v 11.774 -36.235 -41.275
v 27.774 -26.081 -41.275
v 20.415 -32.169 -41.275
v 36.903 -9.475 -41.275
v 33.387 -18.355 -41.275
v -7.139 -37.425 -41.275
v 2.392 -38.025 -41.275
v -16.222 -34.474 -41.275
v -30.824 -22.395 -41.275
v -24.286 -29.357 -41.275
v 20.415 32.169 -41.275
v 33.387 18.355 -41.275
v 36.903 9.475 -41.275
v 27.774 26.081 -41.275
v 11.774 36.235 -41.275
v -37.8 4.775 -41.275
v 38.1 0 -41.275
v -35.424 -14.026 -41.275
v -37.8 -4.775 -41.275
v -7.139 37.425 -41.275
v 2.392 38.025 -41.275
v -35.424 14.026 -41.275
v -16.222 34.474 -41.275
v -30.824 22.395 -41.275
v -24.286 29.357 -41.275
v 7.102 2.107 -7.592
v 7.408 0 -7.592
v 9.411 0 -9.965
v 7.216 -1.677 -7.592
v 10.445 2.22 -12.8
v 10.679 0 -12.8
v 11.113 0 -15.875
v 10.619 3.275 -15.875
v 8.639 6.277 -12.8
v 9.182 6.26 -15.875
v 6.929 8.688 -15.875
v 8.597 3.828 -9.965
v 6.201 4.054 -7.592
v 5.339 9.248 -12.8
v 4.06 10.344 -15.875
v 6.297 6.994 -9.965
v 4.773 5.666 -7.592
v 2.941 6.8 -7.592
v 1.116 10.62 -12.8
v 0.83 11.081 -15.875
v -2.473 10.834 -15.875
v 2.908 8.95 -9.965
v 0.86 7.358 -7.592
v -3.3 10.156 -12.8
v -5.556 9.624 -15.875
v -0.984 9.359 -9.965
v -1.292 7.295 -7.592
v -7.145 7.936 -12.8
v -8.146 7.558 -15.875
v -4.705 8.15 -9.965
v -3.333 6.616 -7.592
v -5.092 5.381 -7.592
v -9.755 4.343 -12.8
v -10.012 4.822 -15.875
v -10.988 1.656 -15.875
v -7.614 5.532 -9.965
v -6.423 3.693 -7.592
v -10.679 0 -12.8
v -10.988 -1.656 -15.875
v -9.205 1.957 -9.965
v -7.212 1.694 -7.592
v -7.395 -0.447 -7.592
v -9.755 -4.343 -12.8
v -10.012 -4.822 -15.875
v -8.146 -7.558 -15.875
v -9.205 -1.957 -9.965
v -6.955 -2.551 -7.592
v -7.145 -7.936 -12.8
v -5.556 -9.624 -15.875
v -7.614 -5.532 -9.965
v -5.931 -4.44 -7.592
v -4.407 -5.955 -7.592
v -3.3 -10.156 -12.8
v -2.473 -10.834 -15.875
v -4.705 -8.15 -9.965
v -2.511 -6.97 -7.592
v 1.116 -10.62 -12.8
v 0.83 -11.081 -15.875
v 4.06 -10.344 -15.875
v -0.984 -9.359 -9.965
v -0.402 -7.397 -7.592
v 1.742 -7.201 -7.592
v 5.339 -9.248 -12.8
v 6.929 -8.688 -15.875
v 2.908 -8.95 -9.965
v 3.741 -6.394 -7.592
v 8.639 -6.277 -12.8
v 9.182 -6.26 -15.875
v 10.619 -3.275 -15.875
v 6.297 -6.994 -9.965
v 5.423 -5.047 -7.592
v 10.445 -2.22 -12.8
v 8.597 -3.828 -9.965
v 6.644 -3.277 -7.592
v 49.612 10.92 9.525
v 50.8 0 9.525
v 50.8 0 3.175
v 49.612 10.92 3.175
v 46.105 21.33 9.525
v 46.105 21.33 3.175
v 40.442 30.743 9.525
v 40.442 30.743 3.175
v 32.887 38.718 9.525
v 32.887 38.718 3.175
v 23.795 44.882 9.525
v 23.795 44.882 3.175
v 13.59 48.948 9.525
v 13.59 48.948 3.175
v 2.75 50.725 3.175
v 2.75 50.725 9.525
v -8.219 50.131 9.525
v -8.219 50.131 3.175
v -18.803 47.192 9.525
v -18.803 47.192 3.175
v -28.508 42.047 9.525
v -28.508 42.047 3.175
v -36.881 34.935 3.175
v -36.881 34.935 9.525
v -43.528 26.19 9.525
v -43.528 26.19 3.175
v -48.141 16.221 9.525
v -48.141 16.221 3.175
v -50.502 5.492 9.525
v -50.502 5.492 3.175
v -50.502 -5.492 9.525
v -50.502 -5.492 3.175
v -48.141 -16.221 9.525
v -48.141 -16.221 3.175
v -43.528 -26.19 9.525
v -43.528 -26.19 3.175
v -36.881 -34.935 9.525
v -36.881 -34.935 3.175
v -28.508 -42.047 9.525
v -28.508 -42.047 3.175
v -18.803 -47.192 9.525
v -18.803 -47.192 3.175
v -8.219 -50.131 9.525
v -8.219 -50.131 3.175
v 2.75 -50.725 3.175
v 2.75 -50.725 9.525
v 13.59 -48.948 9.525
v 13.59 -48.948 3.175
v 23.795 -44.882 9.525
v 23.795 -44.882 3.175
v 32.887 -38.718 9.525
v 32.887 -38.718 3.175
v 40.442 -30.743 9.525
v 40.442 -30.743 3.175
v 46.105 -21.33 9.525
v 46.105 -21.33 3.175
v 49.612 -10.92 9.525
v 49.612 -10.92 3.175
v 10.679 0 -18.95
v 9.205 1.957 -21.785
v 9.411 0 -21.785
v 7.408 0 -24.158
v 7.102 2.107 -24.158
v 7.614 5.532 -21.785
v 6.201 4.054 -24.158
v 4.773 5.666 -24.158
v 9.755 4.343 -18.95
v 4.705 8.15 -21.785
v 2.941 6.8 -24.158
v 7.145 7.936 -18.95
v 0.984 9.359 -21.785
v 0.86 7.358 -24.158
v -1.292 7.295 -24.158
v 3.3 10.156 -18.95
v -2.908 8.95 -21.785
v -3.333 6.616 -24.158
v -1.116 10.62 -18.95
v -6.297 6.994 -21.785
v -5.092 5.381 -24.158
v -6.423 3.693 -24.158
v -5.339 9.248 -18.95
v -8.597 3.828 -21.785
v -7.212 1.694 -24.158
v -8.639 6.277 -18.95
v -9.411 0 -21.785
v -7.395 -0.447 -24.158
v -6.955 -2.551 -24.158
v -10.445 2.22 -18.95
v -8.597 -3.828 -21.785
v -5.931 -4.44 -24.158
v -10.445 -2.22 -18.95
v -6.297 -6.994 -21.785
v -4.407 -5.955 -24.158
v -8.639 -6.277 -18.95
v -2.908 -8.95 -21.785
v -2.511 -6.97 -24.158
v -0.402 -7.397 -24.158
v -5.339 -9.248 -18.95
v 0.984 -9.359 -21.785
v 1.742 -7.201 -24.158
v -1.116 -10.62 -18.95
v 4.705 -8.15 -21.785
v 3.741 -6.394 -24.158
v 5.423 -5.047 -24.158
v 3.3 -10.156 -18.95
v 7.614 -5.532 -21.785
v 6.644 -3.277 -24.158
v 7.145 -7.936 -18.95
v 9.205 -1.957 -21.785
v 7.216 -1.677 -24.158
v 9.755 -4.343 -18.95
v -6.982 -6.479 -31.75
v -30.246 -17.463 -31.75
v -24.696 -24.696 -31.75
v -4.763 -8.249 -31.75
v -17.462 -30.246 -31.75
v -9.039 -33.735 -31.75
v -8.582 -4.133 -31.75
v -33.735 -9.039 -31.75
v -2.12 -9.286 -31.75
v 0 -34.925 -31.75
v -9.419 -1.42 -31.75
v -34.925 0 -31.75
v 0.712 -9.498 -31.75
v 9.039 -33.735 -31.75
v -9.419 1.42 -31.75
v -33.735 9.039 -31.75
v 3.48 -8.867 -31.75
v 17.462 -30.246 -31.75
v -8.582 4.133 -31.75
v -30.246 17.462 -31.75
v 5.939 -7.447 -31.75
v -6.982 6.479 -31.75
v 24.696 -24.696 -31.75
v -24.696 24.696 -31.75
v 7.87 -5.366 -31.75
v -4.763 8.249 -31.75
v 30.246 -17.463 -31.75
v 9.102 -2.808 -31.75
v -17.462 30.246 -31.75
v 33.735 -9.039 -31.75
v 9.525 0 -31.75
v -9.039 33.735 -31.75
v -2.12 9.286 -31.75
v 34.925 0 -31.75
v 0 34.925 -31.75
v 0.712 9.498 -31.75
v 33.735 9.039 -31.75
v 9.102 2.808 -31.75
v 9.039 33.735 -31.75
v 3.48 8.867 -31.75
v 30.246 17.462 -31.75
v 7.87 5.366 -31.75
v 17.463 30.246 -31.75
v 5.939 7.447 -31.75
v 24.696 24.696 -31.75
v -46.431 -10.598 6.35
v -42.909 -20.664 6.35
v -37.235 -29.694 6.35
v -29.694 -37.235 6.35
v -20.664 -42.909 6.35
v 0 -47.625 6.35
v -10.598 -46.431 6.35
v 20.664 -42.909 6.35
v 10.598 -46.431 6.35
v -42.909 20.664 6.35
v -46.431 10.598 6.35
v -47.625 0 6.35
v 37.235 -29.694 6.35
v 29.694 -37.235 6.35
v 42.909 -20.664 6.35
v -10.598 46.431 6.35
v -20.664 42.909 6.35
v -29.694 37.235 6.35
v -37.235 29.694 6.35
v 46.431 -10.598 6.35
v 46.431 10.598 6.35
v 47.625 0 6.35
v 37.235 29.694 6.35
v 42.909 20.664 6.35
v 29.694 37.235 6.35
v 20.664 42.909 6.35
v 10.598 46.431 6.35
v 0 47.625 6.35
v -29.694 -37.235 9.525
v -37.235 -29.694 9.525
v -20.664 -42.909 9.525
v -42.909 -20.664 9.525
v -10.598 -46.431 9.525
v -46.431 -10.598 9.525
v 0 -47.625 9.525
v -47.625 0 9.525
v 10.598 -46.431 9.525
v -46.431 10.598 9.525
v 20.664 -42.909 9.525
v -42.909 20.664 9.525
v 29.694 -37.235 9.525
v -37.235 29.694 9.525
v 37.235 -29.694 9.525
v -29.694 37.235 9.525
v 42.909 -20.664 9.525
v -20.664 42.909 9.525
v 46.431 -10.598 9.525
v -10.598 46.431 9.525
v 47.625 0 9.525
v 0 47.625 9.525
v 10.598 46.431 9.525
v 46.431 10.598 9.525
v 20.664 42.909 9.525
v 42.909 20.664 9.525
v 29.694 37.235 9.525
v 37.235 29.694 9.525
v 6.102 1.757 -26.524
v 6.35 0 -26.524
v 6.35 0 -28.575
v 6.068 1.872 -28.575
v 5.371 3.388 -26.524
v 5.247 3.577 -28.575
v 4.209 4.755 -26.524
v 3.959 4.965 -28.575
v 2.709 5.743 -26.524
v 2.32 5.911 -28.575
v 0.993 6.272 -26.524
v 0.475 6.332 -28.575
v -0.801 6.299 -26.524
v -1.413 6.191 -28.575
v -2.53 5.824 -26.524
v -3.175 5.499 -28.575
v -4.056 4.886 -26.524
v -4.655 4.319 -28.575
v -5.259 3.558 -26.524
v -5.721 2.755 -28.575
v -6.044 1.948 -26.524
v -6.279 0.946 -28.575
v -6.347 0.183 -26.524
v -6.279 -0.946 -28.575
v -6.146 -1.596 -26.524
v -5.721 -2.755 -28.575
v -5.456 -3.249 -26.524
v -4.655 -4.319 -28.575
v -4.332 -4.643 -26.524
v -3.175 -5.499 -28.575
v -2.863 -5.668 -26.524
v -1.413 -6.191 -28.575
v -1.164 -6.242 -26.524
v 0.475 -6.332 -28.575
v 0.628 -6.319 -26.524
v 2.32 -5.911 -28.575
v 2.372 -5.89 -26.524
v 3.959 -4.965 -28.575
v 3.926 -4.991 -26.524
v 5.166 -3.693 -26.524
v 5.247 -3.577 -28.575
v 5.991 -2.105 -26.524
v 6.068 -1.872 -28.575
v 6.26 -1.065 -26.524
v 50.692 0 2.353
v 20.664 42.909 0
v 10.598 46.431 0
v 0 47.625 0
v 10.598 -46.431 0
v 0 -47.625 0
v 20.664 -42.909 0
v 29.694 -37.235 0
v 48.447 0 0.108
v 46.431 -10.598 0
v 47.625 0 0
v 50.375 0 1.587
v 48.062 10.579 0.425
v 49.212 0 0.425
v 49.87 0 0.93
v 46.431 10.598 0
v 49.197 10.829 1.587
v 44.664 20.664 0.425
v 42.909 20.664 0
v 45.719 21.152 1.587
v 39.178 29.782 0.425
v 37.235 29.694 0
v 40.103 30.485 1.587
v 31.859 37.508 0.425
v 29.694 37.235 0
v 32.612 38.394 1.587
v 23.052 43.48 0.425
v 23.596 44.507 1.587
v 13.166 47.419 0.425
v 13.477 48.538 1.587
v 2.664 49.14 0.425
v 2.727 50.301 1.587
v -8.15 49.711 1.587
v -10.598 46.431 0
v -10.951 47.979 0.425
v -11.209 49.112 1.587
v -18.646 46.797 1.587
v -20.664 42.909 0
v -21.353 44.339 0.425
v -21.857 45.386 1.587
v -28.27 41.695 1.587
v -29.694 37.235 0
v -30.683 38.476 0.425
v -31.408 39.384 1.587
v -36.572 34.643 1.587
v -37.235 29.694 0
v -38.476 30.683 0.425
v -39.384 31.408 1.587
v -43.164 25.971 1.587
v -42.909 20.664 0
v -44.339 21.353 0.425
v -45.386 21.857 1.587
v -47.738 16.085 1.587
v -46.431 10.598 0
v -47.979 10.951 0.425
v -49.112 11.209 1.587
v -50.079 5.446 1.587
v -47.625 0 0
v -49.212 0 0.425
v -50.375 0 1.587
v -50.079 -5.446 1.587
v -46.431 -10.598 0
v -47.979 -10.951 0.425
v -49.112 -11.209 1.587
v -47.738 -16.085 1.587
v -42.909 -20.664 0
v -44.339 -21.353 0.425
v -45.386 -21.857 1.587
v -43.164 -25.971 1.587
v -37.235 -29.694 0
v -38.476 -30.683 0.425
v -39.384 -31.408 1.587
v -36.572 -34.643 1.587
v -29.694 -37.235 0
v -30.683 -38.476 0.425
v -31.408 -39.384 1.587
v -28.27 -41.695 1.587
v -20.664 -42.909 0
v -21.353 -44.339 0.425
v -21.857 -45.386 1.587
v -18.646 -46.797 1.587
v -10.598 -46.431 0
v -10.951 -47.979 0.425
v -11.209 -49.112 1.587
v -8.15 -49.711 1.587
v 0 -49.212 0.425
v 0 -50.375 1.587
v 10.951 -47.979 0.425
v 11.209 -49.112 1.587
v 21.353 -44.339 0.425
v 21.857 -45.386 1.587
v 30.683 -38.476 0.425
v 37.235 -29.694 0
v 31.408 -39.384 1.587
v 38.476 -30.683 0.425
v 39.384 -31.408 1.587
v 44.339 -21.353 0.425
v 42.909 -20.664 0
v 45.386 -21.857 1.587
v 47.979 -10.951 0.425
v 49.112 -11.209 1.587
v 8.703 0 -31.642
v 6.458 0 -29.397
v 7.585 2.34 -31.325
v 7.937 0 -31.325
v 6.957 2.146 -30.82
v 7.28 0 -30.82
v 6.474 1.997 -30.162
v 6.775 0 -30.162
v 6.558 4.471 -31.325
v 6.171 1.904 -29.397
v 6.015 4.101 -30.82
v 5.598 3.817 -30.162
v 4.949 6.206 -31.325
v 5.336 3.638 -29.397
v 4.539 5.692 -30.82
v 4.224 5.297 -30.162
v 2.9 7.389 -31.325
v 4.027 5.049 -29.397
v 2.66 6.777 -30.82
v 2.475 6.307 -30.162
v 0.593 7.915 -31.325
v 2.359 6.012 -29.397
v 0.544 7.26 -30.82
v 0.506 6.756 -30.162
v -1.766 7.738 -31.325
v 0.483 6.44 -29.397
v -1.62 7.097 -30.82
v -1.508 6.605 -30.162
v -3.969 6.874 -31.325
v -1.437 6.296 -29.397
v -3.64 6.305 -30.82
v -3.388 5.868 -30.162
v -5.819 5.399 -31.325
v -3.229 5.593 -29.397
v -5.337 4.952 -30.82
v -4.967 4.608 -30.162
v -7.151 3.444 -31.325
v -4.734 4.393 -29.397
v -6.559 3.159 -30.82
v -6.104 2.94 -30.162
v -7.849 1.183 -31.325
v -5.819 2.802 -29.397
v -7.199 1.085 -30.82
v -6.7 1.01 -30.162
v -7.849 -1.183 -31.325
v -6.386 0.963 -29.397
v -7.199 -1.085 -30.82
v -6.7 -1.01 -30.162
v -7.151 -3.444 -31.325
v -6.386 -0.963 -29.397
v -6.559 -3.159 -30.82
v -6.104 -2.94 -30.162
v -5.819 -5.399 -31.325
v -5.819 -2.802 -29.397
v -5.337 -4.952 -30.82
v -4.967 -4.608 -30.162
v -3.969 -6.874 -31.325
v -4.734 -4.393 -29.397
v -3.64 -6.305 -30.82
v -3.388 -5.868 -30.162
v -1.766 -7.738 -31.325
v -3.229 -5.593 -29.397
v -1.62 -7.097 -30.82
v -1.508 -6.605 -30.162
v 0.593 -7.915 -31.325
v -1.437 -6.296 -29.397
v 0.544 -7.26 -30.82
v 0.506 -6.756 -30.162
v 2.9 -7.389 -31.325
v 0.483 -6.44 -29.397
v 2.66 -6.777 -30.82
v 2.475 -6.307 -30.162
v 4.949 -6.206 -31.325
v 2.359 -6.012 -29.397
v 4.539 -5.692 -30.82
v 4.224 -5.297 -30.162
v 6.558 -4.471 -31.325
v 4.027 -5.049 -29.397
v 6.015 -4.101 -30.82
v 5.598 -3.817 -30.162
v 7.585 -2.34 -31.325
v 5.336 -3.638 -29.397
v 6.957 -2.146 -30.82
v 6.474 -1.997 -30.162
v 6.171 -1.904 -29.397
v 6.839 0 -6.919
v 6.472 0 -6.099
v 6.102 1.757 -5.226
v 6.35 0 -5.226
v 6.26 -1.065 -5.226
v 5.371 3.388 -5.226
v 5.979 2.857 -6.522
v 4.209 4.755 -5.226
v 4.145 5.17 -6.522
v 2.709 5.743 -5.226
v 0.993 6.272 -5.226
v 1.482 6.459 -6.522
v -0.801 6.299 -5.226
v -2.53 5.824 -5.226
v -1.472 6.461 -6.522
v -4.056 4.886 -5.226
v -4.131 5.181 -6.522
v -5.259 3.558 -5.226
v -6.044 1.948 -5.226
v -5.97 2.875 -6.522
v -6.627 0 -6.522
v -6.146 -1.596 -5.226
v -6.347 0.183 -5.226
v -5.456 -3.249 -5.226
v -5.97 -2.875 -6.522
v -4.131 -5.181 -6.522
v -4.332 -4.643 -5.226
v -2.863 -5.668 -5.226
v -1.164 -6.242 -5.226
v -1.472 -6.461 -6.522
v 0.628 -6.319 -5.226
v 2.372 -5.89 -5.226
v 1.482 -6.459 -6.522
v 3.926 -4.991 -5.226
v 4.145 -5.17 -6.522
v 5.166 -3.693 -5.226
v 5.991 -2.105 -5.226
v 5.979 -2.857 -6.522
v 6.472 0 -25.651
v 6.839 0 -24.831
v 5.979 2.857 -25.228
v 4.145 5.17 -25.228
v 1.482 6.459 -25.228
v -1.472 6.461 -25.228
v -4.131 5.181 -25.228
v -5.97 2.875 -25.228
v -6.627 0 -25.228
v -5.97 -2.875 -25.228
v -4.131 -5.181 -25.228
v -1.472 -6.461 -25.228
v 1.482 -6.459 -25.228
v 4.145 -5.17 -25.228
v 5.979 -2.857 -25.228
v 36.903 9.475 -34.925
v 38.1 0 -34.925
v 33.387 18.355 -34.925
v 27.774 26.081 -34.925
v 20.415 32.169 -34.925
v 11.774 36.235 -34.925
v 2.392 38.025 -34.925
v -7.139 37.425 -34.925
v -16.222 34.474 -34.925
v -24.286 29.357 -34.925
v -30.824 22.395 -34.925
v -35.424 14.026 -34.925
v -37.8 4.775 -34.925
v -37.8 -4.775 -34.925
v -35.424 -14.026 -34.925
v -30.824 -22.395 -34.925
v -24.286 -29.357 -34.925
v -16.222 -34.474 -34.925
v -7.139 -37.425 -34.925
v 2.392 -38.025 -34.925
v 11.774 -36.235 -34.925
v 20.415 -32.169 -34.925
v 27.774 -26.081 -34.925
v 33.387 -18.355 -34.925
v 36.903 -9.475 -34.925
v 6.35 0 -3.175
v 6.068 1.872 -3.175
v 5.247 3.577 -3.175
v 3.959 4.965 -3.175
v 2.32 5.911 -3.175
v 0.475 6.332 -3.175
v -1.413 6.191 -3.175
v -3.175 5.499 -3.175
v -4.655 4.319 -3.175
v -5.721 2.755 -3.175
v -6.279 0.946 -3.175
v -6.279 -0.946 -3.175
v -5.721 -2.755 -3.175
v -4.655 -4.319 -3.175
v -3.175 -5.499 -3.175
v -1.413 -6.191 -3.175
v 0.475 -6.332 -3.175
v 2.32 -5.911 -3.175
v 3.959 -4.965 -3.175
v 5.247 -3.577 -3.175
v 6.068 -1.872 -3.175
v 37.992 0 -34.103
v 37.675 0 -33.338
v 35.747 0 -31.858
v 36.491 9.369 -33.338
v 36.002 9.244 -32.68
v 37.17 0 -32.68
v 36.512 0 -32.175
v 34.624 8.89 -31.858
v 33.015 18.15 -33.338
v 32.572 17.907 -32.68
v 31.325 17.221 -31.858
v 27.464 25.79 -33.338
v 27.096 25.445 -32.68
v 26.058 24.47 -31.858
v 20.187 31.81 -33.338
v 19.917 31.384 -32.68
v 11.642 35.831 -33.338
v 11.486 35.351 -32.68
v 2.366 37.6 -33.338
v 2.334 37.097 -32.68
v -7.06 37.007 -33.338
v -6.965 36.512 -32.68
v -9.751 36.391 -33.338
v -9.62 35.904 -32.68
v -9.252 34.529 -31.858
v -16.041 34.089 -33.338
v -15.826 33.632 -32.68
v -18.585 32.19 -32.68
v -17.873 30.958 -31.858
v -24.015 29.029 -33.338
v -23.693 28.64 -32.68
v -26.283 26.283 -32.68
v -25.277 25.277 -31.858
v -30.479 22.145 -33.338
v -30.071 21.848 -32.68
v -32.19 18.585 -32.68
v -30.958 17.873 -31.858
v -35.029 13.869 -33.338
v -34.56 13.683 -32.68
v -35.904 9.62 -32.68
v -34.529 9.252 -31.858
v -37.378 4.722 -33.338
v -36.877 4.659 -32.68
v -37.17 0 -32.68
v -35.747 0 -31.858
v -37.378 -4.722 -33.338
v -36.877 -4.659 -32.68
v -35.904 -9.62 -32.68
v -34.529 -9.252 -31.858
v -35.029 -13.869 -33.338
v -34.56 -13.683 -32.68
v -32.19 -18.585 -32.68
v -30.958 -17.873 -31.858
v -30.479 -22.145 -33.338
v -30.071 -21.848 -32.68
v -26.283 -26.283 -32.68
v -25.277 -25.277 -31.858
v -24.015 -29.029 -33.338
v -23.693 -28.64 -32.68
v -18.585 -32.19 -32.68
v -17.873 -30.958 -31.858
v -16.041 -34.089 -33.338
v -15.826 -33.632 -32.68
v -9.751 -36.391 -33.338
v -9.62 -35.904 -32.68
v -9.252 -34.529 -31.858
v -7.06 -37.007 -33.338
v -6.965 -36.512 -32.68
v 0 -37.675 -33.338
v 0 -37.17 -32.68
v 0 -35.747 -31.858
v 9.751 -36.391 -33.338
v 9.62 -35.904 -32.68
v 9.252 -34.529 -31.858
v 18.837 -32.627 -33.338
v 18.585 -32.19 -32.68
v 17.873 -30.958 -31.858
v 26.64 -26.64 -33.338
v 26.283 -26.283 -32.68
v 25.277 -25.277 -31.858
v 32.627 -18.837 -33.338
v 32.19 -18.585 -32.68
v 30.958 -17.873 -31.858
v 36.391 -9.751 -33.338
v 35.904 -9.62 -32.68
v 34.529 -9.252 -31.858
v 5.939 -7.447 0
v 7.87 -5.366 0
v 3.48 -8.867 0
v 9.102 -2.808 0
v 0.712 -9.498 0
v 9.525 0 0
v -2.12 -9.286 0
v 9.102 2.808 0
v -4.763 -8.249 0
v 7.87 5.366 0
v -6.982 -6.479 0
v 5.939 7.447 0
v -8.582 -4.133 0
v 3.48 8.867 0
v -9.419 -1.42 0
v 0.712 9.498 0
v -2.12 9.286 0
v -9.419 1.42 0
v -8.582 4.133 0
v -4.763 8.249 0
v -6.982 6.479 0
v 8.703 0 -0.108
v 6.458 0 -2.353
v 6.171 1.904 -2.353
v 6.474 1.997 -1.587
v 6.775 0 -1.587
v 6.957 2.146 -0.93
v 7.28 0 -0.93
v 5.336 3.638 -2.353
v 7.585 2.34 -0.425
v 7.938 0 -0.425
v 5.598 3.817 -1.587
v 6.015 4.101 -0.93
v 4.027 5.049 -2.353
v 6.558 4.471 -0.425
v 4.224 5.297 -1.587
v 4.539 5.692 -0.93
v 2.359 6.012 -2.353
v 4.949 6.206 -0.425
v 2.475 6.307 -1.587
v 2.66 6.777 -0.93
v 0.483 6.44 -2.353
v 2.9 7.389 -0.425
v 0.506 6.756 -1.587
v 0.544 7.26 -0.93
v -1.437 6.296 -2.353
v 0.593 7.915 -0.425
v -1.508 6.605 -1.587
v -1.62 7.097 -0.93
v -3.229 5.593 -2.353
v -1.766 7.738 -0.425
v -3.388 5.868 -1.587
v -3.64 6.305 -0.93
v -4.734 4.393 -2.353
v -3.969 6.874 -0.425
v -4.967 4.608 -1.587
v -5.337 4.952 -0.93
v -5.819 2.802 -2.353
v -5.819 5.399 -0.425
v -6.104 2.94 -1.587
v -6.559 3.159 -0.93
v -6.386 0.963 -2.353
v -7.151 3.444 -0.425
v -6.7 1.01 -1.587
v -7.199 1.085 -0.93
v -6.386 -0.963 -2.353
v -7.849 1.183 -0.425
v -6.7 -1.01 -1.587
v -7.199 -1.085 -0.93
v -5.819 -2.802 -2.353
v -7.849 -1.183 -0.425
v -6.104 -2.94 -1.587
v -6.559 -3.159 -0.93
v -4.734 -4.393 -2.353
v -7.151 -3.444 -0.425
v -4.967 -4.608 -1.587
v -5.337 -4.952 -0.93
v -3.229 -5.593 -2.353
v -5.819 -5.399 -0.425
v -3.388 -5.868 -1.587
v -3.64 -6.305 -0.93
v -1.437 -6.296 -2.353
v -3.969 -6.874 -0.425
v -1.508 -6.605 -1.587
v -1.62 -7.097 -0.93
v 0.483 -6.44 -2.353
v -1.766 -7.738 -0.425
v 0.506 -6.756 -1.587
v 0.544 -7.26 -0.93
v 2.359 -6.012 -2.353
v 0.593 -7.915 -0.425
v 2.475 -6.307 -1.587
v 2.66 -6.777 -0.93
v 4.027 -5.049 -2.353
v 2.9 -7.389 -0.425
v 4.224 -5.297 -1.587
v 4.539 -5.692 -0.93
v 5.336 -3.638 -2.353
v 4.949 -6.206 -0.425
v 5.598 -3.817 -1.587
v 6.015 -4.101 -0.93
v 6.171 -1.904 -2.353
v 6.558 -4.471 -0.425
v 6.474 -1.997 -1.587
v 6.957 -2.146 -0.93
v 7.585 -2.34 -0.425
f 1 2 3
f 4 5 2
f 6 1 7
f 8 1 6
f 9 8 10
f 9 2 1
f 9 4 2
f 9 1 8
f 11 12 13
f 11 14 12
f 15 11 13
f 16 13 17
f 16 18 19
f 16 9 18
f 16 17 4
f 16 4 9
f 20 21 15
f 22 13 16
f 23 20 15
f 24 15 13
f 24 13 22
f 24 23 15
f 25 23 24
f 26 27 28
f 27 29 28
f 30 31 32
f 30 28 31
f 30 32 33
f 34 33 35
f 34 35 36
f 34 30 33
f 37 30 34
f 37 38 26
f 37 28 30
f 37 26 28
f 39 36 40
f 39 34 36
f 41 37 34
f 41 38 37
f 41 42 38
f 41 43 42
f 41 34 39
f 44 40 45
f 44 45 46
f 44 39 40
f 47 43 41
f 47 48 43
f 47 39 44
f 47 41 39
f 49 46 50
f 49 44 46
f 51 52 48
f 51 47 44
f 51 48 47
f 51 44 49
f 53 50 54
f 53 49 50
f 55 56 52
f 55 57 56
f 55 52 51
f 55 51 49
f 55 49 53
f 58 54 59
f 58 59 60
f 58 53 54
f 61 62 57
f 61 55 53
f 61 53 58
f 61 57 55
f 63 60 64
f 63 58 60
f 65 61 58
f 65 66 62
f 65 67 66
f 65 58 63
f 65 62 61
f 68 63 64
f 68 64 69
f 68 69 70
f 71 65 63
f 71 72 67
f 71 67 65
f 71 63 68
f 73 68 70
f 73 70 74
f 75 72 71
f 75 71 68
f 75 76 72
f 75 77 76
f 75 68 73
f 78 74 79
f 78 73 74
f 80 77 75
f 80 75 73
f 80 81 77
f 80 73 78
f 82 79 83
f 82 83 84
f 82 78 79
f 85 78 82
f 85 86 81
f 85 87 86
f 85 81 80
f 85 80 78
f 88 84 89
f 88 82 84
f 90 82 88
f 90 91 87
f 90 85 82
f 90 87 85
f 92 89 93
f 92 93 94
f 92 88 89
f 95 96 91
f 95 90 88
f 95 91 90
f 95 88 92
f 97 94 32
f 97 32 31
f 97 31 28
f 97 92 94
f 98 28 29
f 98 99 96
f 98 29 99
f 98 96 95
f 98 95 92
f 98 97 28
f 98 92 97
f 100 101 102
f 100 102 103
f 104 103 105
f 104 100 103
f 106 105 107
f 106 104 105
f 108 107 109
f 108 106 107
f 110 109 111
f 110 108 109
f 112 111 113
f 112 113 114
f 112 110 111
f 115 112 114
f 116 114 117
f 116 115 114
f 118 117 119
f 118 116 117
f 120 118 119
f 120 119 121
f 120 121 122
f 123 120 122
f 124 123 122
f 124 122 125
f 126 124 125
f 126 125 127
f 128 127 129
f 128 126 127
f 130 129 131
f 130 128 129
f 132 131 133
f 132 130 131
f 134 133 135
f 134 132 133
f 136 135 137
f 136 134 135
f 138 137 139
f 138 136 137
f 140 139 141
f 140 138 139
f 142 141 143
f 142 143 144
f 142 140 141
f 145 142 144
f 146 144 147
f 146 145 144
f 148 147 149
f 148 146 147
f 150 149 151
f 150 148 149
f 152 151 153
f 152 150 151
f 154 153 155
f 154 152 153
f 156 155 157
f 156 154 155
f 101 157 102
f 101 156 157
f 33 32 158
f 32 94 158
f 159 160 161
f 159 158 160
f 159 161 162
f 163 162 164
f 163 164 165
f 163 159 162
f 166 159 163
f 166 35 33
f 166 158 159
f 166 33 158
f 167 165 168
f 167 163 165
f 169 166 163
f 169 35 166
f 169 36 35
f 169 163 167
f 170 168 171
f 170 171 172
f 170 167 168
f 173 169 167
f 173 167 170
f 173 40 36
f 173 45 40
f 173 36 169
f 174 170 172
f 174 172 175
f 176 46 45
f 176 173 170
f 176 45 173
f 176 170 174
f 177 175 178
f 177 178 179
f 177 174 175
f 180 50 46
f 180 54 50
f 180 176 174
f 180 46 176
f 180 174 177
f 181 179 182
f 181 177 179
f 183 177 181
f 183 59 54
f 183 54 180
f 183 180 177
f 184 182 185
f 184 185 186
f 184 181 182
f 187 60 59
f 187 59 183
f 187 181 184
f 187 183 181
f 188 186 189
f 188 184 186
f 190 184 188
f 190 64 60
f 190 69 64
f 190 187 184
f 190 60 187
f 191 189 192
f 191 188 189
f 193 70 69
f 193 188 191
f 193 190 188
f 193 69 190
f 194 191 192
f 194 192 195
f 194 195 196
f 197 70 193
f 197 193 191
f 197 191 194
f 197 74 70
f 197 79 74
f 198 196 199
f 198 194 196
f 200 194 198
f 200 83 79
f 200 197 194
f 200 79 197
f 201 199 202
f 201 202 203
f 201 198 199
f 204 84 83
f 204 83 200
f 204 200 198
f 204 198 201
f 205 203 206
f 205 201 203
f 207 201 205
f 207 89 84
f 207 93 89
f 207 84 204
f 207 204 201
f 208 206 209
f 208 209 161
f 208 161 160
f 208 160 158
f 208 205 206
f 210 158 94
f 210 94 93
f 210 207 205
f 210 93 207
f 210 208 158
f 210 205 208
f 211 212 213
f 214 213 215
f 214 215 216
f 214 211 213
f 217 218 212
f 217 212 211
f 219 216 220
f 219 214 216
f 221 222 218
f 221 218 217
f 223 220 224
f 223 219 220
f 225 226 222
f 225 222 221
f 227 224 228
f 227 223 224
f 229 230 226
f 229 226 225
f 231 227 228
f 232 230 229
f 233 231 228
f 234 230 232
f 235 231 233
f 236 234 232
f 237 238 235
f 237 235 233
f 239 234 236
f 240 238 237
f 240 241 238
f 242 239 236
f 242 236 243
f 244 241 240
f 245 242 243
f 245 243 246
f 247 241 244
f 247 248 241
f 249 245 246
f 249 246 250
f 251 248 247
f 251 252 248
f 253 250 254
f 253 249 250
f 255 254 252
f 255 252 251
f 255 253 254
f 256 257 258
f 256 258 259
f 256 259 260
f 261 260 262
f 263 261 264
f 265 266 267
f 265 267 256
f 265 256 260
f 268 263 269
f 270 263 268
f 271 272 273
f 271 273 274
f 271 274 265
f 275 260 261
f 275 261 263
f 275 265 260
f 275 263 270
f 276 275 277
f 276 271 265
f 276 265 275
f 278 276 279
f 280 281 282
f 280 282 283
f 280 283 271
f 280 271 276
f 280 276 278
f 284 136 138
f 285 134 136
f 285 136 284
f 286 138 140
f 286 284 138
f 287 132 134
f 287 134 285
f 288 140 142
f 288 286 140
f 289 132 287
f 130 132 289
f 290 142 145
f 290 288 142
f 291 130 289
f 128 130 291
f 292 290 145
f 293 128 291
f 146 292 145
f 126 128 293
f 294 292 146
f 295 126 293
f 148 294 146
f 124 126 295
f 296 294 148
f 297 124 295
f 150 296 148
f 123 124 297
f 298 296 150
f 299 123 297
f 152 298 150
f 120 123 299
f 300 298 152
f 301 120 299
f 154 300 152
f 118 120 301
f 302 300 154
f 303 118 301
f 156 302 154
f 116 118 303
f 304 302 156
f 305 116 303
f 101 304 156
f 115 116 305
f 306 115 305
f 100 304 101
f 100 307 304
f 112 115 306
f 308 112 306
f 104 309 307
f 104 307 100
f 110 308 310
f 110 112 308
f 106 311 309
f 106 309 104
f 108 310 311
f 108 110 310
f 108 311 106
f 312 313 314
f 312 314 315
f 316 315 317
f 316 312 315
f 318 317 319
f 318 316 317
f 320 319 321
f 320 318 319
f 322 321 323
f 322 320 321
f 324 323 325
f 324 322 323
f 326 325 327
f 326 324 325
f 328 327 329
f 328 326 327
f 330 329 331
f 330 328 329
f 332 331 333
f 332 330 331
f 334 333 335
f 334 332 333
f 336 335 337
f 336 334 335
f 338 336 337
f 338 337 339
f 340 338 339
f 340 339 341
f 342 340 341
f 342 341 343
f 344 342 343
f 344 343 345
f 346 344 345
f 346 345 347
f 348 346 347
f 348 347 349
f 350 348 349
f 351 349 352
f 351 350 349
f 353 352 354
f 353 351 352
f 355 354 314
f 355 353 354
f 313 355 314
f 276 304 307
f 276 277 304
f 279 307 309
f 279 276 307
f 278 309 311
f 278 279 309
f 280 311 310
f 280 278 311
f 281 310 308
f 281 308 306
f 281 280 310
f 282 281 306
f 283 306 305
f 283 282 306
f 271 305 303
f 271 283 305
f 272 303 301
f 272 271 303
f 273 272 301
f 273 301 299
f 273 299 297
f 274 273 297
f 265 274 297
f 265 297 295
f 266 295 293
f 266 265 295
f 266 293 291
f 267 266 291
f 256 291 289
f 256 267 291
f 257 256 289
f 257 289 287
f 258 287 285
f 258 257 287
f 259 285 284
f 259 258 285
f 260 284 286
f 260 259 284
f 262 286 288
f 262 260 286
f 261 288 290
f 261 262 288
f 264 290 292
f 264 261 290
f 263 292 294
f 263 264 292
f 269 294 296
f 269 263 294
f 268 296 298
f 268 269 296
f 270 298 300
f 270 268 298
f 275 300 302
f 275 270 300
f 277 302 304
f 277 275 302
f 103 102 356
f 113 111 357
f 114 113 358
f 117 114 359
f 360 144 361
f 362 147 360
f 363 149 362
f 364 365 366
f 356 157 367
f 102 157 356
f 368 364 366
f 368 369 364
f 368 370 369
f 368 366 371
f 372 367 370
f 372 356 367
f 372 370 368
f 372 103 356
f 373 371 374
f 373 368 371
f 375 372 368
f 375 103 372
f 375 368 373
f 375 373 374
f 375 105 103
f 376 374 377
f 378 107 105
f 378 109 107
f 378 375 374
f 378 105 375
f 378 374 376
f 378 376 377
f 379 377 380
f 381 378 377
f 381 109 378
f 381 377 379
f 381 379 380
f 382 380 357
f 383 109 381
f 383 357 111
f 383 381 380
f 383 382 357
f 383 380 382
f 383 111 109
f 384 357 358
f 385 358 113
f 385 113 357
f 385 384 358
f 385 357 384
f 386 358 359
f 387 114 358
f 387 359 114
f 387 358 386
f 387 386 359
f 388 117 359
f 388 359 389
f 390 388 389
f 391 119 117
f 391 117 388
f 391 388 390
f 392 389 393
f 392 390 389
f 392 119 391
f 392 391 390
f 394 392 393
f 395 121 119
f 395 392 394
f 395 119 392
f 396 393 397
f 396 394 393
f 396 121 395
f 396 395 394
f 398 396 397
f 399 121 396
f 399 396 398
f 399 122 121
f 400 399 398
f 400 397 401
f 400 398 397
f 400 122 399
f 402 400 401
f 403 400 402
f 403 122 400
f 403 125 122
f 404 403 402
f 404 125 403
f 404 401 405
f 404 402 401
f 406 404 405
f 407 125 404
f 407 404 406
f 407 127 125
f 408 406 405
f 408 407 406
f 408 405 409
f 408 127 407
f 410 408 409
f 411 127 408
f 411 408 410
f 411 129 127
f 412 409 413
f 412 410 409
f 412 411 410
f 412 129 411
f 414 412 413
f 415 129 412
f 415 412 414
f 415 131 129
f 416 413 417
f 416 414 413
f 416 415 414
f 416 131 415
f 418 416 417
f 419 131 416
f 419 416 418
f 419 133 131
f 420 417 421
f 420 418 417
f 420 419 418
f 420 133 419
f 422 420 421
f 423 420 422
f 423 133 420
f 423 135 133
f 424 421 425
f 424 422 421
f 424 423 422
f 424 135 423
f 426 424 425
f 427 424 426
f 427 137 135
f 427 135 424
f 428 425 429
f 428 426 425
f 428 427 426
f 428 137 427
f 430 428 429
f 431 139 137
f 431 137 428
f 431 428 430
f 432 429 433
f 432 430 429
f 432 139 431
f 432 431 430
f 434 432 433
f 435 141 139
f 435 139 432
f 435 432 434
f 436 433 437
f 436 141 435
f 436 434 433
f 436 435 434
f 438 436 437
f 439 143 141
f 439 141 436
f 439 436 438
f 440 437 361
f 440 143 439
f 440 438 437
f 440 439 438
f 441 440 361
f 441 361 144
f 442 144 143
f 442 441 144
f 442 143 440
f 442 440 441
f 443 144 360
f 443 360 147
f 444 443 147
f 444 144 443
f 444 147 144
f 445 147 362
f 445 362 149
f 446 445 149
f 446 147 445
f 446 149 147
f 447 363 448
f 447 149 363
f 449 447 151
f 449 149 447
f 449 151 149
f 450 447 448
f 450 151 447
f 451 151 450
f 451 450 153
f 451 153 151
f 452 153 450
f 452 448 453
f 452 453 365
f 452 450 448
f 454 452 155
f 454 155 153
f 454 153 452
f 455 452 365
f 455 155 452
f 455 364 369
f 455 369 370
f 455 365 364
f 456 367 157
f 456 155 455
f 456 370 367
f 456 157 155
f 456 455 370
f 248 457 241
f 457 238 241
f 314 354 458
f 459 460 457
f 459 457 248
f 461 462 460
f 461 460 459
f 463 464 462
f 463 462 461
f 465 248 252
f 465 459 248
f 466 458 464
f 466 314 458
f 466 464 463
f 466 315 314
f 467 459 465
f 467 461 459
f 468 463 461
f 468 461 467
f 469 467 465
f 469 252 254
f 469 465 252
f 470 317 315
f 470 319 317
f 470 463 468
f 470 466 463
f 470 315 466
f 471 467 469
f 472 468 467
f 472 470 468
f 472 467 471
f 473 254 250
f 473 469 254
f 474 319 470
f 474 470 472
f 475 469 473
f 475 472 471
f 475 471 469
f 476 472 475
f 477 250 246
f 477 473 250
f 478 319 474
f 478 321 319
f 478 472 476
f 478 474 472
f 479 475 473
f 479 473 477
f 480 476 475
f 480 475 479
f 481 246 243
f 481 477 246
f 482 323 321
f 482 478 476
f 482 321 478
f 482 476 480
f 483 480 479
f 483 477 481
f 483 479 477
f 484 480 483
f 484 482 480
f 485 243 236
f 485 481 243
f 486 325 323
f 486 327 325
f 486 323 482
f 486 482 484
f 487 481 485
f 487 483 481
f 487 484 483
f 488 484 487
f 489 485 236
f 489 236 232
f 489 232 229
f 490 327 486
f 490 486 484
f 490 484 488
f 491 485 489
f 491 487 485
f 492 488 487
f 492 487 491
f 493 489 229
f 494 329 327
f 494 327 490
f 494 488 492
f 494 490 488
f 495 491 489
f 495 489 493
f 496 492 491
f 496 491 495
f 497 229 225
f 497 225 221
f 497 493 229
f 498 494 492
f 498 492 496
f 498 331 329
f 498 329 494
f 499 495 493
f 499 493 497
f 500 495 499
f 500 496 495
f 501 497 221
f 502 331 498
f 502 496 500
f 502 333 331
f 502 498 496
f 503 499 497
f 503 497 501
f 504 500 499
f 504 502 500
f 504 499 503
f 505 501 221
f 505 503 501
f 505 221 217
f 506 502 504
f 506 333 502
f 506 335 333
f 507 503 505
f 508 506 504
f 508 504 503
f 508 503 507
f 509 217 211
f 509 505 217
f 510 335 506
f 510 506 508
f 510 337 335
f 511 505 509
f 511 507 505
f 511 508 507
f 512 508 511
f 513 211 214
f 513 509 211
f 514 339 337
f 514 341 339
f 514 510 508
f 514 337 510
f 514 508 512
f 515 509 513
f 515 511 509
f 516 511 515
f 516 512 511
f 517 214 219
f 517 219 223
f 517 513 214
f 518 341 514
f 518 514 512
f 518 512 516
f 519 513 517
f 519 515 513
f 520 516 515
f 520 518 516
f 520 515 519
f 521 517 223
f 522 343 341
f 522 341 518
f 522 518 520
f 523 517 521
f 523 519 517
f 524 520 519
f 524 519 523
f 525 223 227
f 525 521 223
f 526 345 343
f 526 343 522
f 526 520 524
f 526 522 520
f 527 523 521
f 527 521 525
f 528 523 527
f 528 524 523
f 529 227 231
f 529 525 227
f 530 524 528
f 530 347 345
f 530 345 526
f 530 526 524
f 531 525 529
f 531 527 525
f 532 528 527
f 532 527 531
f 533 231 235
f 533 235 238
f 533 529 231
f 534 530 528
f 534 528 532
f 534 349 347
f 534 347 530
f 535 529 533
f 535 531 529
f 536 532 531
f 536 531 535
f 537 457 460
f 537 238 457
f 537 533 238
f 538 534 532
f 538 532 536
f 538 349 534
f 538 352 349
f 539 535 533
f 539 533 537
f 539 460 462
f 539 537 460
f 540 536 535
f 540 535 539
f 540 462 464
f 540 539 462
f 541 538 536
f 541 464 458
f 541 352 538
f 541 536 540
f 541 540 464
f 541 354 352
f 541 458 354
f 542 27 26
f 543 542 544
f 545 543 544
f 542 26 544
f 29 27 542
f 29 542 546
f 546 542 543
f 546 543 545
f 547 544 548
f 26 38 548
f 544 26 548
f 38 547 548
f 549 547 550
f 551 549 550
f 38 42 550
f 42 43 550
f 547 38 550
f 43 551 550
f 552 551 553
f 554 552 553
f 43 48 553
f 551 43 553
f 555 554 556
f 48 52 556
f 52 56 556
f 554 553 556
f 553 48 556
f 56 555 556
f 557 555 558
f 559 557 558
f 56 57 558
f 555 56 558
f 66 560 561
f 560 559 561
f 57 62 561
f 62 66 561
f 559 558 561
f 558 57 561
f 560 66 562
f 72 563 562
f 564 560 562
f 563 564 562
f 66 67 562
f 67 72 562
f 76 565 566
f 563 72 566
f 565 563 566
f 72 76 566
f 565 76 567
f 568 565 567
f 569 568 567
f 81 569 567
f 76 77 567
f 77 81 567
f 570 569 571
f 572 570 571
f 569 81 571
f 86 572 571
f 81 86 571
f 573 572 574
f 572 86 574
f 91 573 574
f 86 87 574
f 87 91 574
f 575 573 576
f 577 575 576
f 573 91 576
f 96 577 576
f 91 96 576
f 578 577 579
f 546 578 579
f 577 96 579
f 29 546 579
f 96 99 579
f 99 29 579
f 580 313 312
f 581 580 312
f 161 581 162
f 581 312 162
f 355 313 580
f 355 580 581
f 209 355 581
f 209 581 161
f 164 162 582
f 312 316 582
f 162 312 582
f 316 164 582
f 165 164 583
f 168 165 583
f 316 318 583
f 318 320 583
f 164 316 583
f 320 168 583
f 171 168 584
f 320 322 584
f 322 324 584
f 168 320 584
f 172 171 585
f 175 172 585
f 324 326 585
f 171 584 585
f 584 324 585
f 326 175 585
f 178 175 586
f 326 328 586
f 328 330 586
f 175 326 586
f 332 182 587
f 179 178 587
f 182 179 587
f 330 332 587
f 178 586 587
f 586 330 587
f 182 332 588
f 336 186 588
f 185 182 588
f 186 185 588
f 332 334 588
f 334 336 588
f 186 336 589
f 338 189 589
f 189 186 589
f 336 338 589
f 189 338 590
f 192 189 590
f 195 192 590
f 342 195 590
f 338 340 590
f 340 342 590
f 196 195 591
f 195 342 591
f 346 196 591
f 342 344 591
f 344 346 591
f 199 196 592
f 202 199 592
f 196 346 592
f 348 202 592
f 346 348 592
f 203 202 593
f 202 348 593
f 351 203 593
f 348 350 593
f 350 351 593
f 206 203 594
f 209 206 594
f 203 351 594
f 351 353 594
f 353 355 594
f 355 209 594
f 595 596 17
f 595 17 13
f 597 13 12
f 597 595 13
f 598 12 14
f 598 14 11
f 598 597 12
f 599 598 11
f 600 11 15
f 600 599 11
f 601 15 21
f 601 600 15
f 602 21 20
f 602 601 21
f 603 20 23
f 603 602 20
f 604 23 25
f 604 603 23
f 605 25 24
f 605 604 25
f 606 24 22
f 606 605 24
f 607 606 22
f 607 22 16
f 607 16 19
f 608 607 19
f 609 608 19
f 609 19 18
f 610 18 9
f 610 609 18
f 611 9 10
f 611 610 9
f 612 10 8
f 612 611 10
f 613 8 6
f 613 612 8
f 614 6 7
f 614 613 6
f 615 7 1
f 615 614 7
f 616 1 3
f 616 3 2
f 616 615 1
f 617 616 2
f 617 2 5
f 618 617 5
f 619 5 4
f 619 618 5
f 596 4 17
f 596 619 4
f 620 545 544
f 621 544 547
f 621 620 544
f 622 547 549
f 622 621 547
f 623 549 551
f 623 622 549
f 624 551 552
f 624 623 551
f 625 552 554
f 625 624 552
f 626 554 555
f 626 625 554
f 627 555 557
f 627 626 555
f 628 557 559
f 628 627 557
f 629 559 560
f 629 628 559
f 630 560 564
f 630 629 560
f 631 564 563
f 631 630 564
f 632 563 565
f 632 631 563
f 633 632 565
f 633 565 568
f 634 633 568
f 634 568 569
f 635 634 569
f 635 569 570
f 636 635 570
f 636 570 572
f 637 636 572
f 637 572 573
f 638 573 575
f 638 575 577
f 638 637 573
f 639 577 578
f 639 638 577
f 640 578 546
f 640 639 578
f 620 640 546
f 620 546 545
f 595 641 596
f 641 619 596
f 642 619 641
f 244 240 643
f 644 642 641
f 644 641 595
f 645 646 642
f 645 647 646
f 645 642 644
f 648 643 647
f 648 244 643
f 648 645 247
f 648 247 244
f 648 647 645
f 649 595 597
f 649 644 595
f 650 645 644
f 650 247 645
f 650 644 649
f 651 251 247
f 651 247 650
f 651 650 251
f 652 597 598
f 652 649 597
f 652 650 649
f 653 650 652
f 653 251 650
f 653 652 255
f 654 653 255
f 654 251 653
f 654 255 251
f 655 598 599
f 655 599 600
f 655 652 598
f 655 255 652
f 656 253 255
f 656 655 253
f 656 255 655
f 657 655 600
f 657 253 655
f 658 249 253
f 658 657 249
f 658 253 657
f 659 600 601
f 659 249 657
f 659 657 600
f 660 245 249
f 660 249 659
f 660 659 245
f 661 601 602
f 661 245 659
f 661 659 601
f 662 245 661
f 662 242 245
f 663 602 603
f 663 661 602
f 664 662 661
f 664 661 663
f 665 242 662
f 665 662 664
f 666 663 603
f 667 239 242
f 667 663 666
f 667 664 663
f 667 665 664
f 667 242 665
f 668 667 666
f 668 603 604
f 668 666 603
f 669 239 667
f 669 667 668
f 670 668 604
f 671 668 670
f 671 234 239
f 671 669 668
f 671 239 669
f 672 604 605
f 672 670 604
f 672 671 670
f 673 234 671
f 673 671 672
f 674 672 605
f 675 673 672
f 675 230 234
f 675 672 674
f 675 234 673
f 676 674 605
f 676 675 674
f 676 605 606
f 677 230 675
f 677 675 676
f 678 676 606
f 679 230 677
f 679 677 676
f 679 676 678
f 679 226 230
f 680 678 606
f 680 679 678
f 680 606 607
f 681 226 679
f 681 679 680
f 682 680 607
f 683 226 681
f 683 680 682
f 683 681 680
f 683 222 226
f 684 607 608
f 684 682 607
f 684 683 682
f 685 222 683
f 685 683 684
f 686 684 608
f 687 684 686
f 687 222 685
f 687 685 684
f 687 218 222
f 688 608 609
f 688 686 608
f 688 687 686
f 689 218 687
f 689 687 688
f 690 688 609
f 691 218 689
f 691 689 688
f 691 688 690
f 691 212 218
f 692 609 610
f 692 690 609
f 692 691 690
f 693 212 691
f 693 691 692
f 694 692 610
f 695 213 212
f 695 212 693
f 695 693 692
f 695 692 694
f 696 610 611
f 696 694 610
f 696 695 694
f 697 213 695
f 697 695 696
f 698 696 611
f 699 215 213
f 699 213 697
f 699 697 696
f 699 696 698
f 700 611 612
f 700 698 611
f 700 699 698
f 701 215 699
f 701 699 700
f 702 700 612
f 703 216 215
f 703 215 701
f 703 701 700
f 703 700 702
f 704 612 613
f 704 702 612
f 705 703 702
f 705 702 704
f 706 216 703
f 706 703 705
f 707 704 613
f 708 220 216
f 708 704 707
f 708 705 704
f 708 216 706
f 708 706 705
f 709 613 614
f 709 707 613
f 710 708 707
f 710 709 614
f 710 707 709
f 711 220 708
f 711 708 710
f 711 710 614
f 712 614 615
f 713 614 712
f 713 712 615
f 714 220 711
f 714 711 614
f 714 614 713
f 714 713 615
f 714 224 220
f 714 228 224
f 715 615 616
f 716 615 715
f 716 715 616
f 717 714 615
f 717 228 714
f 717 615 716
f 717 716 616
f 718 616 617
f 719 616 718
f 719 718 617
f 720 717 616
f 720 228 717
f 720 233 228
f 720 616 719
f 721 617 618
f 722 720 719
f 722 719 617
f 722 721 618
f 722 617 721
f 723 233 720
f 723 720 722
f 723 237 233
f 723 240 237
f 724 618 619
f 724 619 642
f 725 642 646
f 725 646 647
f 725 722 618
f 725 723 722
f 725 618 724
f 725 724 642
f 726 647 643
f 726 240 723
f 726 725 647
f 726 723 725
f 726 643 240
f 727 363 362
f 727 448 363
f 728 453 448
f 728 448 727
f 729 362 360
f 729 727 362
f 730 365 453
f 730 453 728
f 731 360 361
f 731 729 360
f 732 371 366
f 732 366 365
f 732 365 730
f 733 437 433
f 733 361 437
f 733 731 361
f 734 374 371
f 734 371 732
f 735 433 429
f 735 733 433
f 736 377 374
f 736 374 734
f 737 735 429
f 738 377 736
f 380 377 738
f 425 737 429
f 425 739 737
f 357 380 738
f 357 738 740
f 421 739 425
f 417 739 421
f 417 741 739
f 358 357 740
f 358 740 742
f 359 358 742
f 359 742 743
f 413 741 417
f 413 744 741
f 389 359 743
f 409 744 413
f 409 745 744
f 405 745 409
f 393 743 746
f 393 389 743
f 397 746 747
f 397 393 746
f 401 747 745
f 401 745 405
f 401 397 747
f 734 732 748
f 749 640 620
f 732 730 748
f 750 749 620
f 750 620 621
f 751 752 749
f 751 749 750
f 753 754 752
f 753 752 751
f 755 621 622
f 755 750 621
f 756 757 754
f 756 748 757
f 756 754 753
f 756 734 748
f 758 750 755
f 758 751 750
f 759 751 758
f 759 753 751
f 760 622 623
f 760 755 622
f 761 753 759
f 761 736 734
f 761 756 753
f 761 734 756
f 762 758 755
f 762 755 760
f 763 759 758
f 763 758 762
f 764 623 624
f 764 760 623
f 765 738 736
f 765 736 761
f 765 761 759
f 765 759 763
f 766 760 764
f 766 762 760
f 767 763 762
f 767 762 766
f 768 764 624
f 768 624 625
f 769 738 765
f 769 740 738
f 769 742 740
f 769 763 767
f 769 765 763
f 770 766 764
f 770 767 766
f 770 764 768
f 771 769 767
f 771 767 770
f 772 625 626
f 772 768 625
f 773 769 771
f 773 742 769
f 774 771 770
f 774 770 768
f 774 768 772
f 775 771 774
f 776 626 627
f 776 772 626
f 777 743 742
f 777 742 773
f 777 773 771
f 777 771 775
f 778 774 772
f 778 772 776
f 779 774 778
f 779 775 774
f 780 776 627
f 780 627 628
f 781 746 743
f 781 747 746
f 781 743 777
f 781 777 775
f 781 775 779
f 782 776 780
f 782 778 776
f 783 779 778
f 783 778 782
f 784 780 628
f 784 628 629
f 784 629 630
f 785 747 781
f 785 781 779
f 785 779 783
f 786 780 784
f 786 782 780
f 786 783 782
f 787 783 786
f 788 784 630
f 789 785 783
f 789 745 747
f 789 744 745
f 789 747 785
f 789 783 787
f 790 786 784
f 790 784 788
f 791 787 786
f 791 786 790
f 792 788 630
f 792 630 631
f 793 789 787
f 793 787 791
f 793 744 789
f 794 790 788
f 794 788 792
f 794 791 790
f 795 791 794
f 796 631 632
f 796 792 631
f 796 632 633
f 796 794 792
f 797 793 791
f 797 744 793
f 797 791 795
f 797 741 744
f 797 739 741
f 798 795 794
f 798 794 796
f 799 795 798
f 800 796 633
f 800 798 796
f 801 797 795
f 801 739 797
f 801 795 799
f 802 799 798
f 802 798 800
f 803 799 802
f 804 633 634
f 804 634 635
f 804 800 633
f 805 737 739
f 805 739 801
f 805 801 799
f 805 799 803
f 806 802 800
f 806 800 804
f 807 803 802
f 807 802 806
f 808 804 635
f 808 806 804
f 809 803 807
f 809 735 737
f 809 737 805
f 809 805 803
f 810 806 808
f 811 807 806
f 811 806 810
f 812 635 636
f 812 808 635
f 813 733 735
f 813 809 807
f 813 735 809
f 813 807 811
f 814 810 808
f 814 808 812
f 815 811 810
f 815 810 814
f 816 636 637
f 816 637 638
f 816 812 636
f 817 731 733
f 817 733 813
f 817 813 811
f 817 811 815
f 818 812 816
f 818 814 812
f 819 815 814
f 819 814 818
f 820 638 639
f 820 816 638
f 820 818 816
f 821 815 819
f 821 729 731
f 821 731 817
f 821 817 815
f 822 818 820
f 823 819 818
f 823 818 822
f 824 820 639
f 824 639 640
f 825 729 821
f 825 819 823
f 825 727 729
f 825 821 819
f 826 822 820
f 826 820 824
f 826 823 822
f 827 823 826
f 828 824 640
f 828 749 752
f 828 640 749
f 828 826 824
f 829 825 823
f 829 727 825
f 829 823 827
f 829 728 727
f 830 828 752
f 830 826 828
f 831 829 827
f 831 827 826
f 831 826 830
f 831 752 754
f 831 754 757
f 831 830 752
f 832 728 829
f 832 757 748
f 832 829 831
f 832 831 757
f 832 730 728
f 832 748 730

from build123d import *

# Parameters (mm, degrees)
F2_R = 3.175


# Not quite as in the source:
# - a feature names something its author has since deleted; it is built from what else it names


with BuildPart() as f1:
    # F0 (on Front) → F1 (revolve)
    with BuildSketch(Plane.XZ):
        Polygon((0, 6.35), (0, 0), (6.35, 0), (50.8, 0), (50.8, 9.525), (47.625, 9.525), (47.625, 6.35), align=None)
        Polygon((6.35, -31.75), (0, -31.75), (0, -41.275), (38.1, -41.275), (38.1, -31.75), align=None)
        with BuildLine():
            Line((6.35, 0), (0, 0))
            Line((0, 0), (0, -4.7625))
            ThreePointArc((0, -4.7625), (3.3277085246, -5.2724525596), (6.35, -6.7555067986))
            Line((6.35, -6.7555067986), (6.35, 0))
        make_face()
        with BuildLine():
            ThreePointArc((6.35, -24.9944932014), (3.3277085246, -26.4775474404), (0, -26.9875))
            Line((0, -26.9875), (0, -31.75))
            Line((0, -31.75), (6.35, -31.75))
            Line((6.35, -31.75), (6.35, -24.9944932014))
        make_face()
        with BuildLine():
            ThreePointArc((6.35, -6.7555067986), (3.3277085246, -5.2724525596), (0, -4.7625))
            Line((0, -4.7625), (0, -26.9875))
            ThreePointArc((0, -26.9875), (3.3277085246, -26.4775474404), (6.35, -24.9944932014))
            Line((6.35, -24.9944932014), (6.35, -6.7555067986))
        make_face()
        with BuildLine():
            ThreePointArc((11.1125, -15.875), (9.8501784565, -10.7309120706), (6.35, -6.7555067986))
            Line((6.35, -6.7555067986), (6.35, -24.9944932014))
            ThreePointArc((6.35, -24.9944932014), (9.8501784565, -21.0190879294), (11.1125, -15.875))
        make_face()
    revolve(axis=Axis((0, 0, 19.689680915), (0, 0, 1)))

    # F2
    f2_edges = [f1.edges().sort_by_distance(p)[0] for p in [
        (-6.35, 0, 0),
        (-6.35, 0, -6.755507),
        (11.1125, 0, -15.875),
        (6.35, 0, -3.377753),
        (-6.35, 0, -24.994493),
        (6.35, 0, -28.372247),
        (-6.35, 0, -31.75),
        (-50.8, 0, 0),
        (-38.1, 0, -31.75),
    ]]
    fillet(f2_edges, radius=F2_R)


solid = f1.part
